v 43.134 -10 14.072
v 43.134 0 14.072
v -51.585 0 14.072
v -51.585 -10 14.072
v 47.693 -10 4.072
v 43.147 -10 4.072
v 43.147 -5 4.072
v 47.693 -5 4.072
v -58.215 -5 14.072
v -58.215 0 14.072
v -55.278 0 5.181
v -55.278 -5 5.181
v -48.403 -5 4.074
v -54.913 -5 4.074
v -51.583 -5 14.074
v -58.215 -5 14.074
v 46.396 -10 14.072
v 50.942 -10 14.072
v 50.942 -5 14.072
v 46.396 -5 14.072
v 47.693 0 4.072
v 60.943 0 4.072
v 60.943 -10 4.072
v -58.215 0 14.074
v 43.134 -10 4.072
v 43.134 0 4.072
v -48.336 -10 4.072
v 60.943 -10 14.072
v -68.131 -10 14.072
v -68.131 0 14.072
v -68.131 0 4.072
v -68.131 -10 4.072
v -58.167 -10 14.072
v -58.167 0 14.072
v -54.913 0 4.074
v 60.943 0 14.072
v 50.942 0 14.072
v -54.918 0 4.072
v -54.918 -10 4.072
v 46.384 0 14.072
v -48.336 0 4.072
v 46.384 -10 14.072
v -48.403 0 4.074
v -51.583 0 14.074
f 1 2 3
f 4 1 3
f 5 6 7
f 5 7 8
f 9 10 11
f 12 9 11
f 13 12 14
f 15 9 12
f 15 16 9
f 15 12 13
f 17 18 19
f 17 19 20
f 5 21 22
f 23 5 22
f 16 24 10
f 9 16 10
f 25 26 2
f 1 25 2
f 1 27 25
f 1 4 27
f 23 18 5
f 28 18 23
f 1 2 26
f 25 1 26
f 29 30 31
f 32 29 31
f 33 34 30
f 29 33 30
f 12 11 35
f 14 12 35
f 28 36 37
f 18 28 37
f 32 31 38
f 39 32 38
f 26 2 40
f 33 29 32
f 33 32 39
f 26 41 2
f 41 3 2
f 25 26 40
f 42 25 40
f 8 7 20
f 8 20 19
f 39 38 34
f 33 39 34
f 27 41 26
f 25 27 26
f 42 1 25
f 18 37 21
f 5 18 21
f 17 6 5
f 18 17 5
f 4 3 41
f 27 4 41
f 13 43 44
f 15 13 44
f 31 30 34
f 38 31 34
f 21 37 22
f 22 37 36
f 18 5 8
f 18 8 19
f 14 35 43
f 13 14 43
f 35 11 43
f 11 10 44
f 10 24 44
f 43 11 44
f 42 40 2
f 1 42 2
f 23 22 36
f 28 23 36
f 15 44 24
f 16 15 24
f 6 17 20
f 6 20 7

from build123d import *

# Parameters (mm, degrees)
F1_DEPTH = 10
F3_DEPTH = 5
F5_DEPTH = 10
F7_DEPTH = 5


with BuildPart() as f1:
    # F0 (on Front) → F1 (new body)
    with BuildSketch(Plane.XZ):
        Polygon((-58.167155, 14.072056), (-68.130615, 14.072056), (-68.130615, 4.072056), (-54.917958, 4.072056), align=None)
        Polygon((-48.335672, 4.072056), (43.134328, 4.072056), (43.134328, 14.072056), (-51.584869, 14.072056), align=None)
    extrude(amount=F1_DEPTH)


with BuildPart() as f3:
    # F2 (on face) → F3 (new body)
    with BuildSketch(Plane.XZ):
        Polygon((-55.278173, 5.180683), (-54.912802, 4.074413), (-48.403356, 4.074413), (-51.583432, 14.074158), (-58.215443, 14.074158), (-58.214749, 14.072056), (-58.167155, 14.072056), align=None)
        Polygon((-58.215443, 14.074158), (-54.912802, 4.074413), (-48.403356, 4.074413), (-51.583432, 14.074158), align=None)
    extrude(amount=F3_DEPTH)


with BuildPart() as f5:
    # F4 (on face) → F5 (new body)
    with BuildSketch(Plane.XZ):
        Polygon((60.942759, 4.072056), (60.942759, 14.072056), (50.941956, 14.072056), (47.692759, 4.072056), align=None)
        Polygon((46.383525, 14.072056), (43.134328, 14.072056), (43.134328, 4.072056), align=None)
    extrude(amount=F5_DEPTH)


with BuildPart() as f7:
    # F6 (on face) → F7 (new body)
    with BuildSketch(Plane.XZ.offset(10)):
        Polygon((47.692759, 4.072056), (50.941956, 14.072056), (46.395757, 14.072056), (43.14656, 4.072056), align=None)
    extrude(amount=-F7_DEPTH)


solid = Compound([f1.part, f3.part, f5.part, f7.part])
